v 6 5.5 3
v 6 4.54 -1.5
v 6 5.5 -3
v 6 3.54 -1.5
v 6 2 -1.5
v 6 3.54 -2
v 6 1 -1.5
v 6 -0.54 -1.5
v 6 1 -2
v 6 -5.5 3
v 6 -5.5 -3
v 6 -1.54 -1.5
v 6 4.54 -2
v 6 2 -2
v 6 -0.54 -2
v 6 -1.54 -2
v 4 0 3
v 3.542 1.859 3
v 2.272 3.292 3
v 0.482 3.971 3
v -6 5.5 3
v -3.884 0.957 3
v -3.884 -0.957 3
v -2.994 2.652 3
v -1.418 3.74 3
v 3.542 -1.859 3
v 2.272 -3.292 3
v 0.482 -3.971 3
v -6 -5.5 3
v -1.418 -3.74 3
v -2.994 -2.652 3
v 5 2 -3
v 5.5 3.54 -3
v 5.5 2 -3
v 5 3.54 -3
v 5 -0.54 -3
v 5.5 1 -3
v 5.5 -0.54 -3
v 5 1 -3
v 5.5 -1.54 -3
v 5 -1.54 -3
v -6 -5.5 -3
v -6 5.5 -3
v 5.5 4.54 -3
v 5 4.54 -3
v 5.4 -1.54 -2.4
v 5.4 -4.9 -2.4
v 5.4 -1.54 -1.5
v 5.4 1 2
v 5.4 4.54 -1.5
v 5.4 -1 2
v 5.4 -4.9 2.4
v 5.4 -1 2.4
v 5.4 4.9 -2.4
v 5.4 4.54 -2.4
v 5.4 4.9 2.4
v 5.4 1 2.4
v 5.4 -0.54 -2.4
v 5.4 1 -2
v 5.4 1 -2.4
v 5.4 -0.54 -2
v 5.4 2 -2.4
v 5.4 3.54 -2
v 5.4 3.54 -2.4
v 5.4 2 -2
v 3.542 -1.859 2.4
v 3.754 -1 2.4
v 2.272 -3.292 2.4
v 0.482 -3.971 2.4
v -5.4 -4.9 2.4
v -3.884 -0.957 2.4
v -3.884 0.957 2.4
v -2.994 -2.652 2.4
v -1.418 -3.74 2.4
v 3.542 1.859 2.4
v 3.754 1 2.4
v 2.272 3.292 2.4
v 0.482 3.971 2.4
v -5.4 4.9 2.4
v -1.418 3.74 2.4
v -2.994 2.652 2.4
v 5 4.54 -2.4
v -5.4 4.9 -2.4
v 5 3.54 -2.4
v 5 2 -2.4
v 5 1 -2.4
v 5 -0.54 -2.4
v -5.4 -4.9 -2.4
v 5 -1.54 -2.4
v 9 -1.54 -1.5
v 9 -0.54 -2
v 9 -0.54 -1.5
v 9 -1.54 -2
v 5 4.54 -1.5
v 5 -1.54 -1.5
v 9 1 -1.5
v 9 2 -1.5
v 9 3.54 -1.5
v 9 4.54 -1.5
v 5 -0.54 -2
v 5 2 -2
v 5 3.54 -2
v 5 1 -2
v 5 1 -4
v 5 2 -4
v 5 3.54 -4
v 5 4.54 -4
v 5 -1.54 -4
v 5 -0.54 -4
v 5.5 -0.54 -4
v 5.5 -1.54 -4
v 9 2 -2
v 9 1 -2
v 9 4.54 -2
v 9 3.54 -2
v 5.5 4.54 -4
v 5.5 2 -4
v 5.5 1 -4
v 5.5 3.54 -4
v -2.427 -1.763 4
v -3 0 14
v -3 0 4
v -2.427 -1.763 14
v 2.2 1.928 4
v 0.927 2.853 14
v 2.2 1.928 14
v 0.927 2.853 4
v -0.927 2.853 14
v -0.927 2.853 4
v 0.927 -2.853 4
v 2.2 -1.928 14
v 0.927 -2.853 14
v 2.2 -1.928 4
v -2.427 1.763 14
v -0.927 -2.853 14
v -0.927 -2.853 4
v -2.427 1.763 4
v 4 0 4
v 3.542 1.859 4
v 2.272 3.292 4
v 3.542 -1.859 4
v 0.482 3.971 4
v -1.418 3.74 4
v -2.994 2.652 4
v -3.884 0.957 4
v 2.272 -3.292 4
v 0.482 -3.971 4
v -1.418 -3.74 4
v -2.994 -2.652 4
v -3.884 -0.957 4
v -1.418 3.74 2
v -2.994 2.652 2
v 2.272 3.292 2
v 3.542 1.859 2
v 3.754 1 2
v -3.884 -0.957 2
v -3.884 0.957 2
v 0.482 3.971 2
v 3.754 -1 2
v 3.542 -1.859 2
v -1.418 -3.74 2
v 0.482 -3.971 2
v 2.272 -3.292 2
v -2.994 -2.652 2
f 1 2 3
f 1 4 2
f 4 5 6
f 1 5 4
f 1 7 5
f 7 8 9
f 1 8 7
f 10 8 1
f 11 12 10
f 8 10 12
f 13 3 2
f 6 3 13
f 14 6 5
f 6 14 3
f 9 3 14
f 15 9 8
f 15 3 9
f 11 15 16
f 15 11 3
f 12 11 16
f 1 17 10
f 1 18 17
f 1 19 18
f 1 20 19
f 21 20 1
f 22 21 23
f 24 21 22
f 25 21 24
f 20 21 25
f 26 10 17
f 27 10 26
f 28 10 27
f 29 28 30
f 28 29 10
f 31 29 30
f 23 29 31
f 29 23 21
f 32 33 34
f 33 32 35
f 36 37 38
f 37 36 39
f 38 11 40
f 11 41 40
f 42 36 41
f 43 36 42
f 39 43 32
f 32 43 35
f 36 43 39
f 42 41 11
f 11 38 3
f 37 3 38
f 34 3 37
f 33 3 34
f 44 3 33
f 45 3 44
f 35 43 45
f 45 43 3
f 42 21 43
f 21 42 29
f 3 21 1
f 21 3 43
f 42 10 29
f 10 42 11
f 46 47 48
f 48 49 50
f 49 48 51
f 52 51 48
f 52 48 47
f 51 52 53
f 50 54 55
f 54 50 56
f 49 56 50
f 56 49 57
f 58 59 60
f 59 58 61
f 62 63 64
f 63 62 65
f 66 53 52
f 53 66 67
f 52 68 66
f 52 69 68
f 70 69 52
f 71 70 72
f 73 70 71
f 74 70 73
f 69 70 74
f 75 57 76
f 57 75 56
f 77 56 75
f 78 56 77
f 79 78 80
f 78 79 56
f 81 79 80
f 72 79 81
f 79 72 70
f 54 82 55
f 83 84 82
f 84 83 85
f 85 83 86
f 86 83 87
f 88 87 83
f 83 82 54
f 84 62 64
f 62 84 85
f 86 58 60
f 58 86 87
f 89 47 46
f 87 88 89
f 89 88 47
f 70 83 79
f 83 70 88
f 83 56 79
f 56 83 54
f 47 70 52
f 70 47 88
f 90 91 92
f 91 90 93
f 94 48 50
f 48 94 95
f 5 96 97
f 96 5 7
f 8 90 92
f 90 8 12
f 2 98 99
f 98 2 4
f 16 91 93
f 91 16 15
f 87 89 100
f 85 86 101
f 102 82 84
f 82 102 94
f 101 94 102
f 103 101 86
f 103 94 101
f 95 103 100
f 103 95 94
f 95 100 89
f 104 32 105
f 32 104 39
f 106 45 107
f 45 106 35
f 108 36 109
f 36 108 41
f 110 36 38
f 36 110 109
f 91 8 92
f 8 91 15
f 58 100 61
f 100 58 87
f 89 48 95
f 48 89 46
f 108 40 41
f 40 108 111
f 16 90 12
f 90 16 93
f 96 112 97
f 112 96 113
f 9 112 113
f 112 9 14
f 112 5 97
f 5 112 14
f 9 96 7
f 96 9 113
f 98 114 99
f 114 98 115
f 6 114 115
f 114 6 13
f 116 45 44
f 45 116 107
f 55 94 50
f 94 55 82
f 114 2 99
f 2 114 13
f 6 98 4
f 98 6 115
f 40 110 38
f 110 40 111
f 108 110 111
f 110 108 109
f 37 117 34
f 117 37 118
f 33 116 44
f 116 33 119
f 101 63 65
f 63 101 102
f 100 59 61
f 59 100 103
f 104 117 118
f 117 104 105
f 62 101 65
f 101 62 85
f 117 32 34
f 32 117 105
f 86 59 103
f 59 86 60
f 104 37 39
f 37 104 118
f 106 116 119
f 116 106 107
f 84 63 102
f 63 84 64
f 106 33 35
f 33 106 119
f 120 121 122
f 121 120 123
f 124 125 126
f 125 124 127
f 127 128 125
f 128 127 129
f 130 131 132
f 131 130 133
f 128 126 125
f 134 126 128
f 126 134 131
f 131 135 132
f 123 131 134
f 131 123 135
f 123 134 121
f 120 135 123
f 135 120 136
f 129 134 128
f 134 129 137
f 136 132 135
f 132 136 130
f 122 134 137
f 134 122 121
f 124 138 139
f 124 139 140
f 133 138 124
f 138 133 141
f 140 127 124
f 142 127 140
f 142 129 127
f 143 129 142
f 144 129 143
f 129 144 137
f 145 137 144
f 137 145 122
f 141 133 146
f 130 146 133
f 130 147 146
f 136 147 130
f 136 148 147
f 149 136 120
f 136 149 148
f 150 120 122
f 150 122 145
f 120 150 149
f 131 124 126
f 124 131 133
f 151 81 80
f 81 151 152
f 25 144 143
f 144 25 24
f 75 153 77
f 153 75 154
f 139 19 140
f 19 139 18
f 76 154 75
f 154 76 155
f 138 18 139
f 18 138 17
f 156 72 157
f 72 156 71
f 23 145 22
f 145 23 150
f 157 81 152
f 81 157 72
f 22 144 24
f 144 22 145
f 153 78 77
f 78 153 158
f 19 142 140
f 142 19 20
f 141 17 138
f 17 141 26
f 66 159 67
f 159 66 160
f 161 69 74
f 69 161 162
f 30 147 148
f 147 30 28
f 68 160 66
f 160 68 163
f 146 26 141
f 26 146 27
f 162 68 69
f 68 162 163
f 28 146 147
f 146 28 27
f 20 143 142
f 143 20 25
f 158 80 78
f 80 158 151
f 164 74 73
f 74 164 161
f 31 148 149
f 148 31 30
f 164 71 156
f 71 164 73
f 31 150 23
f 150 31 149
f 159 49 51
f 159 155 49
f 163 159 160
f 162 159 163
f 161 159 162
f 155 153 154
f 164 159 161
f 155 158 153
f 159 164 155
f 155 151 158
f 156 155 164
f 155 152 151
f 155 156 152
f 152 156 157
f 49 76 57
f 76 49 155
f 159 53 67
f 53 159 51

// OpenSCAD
// Parameters
body_length = 12; //[6:24:1]
body_width = 11; //[6:22:1]
body_height = 6; //[3:12:1]
shaft_diameter = 6; //[3:12:0.5]
shaft_height = 10; //[5:20:1]
collar_diameter = 8; //[4:16:0.5]
collar_height = 2; //[1:6:0.5]
lead_thickness = 0.5; //[0.25:1:0.05]
lead_width = 1; //[0.5:2:0.1]
lead_length = 4; //[2:10:0.5]
lead_pitch = 2.54; //[1.27:5.08:0.01]
lead_row_offset = 1.5; //[0.5:4:0.1]
shaft_flat_depth = 0.8; //[0.2:2:0.1]
shaft_flat_width = 4; //[2:8:0.5]
overlap = 1; //[0.5:2:0.1]
terminal_bend_length = 2; //[1:6:0.5]
anti_rotation_tab_length = 3; //[1.5:8:0.5]
anti_rotation_tab_width = 2; //[1:6:0.5]
anti_rotation_tab_thickness = 1; //[0.5:3:0.5]
mounting_thread_diameter = 7; //[4:14:0.5]
mounting_thread_height = 1.5; //[0.5:4:0.5]
chamfer_amount = 0.6; //[0.2:1.5:0.1]

// Main body with chamfers
module main_body() {
  difference() {
    cube([body_length, body_width, body_height], center=true);
    translate([0, 0, 0])
      cube([body_length - 2*chamfer_amount, body_width - 2*chamfer_amount, body_height - 2*chamfer_amount], center=true);
  }
}

// Bushing collar
module bushing_collar() {
  translate([0, 0, body_height/2 + collar_height/2 - overlap])
    cylinder(h=collar_height, r=collar_diameter/2, center=true);
}

// Shaft with flat
module shaft_with_flat() {
  difference() {
    translate([0, 0, body_height/2 + collar_height + shaft_height/2 - overlap])
      cylinder(h=shaft_height, r=shaft_diameter/2, center=true);
    translate([shaft_diameter/2 - shaft_flat_depth + shaft_diameter/2, 0, body_height/2 + collar_height + shaft_height/2 - overlap])
      cube([shaft_diameter, shaft_flat_width, shaft_height + collar_height + body_height], center=true);
  }
}

// Mounting thread detail
module mounting_thread_detail() {
  translate([0, 0, body_height/2 + mounting_thread_height/2 - overlap])
    cylinder(h=mounting_thread_height, r=mounting_thread_diameter/2, center=true);
}

// Anti-rotation tab
module anti_rotation_tab() {
  translate([collar_diameter/2 + anti_rotation_tab_length/2 - overlap, 0, body_height/2 + anti_rotation_tab_thickness/2 - overlap])
    cube([anti_rotation_tab_length, anti_rotation_tab_width, anti_rotation_tab_thickness], center=true);
}

// Terminals
module terminals() {
  union() {
    translate([body_length/2 + lead_length/2 - overlap, lead_row_offset - lead_pitch, -body_height/2 + lead_thickness/2 + overlap])
      cube([lead_length, lead_width, lead_thickness], center=true);
    translate([body_length/2 + lead_length/2 - overlap, lead_row_offset, -body_height/2 + lead_thickness/2 + overlap])
      cube([lead_length, lead_width, lead_thickness], center=true);
    translate([body_length/2 + lead_length/2 - overlap, lead_row_offset + lead_pitch, -body_height/2 + lead_thickness/2 + overlap])
      cube([lead_length, lead_width, lead_thickness], center=true);
    translate([body_length/2 + lead_thickness/2 - overlap, lead_row_offset - lead_pitch, -body_height/2 - terminal_bend_length/2 + overlap])
      cube([lead_thickness, lead_width, terminal_bend_length], center=true);
    translate([body_length/2 + lead_thickness/2 - overlap, lead_row_offset, -body_height/2 - terminal_bend_length/2 + overlap])
      cube([lead_thickness, lead_width, terminal_bend_length], center=true);
    translate([body_length/2 + lead_thickness/2 - overlap, lead_row_offset + lead_pitch, -body_height/2 - terminal_bend_length/2 + overlap])
      cube([lead_thickness, lead_width, terminal_bend_length], center=true);
    translate([body_length/2 + lead_thickness/2 - overlap, lead_row_offset, -body_height/2 + lead_thickness/2 + overlap])
      cube([lead_thickness, 2*lead_pitch + lead_width, lead_thickness], center=true);
  }
}

// Complete model
module complete_model() {
  union() {
    main_body();
    bushing_collar();
    mounting_thread_detail();
    anti_rotation_tab();
    terminals();
    shaft_with_flat();
  }
}

// Render the complete model
complete_model();
